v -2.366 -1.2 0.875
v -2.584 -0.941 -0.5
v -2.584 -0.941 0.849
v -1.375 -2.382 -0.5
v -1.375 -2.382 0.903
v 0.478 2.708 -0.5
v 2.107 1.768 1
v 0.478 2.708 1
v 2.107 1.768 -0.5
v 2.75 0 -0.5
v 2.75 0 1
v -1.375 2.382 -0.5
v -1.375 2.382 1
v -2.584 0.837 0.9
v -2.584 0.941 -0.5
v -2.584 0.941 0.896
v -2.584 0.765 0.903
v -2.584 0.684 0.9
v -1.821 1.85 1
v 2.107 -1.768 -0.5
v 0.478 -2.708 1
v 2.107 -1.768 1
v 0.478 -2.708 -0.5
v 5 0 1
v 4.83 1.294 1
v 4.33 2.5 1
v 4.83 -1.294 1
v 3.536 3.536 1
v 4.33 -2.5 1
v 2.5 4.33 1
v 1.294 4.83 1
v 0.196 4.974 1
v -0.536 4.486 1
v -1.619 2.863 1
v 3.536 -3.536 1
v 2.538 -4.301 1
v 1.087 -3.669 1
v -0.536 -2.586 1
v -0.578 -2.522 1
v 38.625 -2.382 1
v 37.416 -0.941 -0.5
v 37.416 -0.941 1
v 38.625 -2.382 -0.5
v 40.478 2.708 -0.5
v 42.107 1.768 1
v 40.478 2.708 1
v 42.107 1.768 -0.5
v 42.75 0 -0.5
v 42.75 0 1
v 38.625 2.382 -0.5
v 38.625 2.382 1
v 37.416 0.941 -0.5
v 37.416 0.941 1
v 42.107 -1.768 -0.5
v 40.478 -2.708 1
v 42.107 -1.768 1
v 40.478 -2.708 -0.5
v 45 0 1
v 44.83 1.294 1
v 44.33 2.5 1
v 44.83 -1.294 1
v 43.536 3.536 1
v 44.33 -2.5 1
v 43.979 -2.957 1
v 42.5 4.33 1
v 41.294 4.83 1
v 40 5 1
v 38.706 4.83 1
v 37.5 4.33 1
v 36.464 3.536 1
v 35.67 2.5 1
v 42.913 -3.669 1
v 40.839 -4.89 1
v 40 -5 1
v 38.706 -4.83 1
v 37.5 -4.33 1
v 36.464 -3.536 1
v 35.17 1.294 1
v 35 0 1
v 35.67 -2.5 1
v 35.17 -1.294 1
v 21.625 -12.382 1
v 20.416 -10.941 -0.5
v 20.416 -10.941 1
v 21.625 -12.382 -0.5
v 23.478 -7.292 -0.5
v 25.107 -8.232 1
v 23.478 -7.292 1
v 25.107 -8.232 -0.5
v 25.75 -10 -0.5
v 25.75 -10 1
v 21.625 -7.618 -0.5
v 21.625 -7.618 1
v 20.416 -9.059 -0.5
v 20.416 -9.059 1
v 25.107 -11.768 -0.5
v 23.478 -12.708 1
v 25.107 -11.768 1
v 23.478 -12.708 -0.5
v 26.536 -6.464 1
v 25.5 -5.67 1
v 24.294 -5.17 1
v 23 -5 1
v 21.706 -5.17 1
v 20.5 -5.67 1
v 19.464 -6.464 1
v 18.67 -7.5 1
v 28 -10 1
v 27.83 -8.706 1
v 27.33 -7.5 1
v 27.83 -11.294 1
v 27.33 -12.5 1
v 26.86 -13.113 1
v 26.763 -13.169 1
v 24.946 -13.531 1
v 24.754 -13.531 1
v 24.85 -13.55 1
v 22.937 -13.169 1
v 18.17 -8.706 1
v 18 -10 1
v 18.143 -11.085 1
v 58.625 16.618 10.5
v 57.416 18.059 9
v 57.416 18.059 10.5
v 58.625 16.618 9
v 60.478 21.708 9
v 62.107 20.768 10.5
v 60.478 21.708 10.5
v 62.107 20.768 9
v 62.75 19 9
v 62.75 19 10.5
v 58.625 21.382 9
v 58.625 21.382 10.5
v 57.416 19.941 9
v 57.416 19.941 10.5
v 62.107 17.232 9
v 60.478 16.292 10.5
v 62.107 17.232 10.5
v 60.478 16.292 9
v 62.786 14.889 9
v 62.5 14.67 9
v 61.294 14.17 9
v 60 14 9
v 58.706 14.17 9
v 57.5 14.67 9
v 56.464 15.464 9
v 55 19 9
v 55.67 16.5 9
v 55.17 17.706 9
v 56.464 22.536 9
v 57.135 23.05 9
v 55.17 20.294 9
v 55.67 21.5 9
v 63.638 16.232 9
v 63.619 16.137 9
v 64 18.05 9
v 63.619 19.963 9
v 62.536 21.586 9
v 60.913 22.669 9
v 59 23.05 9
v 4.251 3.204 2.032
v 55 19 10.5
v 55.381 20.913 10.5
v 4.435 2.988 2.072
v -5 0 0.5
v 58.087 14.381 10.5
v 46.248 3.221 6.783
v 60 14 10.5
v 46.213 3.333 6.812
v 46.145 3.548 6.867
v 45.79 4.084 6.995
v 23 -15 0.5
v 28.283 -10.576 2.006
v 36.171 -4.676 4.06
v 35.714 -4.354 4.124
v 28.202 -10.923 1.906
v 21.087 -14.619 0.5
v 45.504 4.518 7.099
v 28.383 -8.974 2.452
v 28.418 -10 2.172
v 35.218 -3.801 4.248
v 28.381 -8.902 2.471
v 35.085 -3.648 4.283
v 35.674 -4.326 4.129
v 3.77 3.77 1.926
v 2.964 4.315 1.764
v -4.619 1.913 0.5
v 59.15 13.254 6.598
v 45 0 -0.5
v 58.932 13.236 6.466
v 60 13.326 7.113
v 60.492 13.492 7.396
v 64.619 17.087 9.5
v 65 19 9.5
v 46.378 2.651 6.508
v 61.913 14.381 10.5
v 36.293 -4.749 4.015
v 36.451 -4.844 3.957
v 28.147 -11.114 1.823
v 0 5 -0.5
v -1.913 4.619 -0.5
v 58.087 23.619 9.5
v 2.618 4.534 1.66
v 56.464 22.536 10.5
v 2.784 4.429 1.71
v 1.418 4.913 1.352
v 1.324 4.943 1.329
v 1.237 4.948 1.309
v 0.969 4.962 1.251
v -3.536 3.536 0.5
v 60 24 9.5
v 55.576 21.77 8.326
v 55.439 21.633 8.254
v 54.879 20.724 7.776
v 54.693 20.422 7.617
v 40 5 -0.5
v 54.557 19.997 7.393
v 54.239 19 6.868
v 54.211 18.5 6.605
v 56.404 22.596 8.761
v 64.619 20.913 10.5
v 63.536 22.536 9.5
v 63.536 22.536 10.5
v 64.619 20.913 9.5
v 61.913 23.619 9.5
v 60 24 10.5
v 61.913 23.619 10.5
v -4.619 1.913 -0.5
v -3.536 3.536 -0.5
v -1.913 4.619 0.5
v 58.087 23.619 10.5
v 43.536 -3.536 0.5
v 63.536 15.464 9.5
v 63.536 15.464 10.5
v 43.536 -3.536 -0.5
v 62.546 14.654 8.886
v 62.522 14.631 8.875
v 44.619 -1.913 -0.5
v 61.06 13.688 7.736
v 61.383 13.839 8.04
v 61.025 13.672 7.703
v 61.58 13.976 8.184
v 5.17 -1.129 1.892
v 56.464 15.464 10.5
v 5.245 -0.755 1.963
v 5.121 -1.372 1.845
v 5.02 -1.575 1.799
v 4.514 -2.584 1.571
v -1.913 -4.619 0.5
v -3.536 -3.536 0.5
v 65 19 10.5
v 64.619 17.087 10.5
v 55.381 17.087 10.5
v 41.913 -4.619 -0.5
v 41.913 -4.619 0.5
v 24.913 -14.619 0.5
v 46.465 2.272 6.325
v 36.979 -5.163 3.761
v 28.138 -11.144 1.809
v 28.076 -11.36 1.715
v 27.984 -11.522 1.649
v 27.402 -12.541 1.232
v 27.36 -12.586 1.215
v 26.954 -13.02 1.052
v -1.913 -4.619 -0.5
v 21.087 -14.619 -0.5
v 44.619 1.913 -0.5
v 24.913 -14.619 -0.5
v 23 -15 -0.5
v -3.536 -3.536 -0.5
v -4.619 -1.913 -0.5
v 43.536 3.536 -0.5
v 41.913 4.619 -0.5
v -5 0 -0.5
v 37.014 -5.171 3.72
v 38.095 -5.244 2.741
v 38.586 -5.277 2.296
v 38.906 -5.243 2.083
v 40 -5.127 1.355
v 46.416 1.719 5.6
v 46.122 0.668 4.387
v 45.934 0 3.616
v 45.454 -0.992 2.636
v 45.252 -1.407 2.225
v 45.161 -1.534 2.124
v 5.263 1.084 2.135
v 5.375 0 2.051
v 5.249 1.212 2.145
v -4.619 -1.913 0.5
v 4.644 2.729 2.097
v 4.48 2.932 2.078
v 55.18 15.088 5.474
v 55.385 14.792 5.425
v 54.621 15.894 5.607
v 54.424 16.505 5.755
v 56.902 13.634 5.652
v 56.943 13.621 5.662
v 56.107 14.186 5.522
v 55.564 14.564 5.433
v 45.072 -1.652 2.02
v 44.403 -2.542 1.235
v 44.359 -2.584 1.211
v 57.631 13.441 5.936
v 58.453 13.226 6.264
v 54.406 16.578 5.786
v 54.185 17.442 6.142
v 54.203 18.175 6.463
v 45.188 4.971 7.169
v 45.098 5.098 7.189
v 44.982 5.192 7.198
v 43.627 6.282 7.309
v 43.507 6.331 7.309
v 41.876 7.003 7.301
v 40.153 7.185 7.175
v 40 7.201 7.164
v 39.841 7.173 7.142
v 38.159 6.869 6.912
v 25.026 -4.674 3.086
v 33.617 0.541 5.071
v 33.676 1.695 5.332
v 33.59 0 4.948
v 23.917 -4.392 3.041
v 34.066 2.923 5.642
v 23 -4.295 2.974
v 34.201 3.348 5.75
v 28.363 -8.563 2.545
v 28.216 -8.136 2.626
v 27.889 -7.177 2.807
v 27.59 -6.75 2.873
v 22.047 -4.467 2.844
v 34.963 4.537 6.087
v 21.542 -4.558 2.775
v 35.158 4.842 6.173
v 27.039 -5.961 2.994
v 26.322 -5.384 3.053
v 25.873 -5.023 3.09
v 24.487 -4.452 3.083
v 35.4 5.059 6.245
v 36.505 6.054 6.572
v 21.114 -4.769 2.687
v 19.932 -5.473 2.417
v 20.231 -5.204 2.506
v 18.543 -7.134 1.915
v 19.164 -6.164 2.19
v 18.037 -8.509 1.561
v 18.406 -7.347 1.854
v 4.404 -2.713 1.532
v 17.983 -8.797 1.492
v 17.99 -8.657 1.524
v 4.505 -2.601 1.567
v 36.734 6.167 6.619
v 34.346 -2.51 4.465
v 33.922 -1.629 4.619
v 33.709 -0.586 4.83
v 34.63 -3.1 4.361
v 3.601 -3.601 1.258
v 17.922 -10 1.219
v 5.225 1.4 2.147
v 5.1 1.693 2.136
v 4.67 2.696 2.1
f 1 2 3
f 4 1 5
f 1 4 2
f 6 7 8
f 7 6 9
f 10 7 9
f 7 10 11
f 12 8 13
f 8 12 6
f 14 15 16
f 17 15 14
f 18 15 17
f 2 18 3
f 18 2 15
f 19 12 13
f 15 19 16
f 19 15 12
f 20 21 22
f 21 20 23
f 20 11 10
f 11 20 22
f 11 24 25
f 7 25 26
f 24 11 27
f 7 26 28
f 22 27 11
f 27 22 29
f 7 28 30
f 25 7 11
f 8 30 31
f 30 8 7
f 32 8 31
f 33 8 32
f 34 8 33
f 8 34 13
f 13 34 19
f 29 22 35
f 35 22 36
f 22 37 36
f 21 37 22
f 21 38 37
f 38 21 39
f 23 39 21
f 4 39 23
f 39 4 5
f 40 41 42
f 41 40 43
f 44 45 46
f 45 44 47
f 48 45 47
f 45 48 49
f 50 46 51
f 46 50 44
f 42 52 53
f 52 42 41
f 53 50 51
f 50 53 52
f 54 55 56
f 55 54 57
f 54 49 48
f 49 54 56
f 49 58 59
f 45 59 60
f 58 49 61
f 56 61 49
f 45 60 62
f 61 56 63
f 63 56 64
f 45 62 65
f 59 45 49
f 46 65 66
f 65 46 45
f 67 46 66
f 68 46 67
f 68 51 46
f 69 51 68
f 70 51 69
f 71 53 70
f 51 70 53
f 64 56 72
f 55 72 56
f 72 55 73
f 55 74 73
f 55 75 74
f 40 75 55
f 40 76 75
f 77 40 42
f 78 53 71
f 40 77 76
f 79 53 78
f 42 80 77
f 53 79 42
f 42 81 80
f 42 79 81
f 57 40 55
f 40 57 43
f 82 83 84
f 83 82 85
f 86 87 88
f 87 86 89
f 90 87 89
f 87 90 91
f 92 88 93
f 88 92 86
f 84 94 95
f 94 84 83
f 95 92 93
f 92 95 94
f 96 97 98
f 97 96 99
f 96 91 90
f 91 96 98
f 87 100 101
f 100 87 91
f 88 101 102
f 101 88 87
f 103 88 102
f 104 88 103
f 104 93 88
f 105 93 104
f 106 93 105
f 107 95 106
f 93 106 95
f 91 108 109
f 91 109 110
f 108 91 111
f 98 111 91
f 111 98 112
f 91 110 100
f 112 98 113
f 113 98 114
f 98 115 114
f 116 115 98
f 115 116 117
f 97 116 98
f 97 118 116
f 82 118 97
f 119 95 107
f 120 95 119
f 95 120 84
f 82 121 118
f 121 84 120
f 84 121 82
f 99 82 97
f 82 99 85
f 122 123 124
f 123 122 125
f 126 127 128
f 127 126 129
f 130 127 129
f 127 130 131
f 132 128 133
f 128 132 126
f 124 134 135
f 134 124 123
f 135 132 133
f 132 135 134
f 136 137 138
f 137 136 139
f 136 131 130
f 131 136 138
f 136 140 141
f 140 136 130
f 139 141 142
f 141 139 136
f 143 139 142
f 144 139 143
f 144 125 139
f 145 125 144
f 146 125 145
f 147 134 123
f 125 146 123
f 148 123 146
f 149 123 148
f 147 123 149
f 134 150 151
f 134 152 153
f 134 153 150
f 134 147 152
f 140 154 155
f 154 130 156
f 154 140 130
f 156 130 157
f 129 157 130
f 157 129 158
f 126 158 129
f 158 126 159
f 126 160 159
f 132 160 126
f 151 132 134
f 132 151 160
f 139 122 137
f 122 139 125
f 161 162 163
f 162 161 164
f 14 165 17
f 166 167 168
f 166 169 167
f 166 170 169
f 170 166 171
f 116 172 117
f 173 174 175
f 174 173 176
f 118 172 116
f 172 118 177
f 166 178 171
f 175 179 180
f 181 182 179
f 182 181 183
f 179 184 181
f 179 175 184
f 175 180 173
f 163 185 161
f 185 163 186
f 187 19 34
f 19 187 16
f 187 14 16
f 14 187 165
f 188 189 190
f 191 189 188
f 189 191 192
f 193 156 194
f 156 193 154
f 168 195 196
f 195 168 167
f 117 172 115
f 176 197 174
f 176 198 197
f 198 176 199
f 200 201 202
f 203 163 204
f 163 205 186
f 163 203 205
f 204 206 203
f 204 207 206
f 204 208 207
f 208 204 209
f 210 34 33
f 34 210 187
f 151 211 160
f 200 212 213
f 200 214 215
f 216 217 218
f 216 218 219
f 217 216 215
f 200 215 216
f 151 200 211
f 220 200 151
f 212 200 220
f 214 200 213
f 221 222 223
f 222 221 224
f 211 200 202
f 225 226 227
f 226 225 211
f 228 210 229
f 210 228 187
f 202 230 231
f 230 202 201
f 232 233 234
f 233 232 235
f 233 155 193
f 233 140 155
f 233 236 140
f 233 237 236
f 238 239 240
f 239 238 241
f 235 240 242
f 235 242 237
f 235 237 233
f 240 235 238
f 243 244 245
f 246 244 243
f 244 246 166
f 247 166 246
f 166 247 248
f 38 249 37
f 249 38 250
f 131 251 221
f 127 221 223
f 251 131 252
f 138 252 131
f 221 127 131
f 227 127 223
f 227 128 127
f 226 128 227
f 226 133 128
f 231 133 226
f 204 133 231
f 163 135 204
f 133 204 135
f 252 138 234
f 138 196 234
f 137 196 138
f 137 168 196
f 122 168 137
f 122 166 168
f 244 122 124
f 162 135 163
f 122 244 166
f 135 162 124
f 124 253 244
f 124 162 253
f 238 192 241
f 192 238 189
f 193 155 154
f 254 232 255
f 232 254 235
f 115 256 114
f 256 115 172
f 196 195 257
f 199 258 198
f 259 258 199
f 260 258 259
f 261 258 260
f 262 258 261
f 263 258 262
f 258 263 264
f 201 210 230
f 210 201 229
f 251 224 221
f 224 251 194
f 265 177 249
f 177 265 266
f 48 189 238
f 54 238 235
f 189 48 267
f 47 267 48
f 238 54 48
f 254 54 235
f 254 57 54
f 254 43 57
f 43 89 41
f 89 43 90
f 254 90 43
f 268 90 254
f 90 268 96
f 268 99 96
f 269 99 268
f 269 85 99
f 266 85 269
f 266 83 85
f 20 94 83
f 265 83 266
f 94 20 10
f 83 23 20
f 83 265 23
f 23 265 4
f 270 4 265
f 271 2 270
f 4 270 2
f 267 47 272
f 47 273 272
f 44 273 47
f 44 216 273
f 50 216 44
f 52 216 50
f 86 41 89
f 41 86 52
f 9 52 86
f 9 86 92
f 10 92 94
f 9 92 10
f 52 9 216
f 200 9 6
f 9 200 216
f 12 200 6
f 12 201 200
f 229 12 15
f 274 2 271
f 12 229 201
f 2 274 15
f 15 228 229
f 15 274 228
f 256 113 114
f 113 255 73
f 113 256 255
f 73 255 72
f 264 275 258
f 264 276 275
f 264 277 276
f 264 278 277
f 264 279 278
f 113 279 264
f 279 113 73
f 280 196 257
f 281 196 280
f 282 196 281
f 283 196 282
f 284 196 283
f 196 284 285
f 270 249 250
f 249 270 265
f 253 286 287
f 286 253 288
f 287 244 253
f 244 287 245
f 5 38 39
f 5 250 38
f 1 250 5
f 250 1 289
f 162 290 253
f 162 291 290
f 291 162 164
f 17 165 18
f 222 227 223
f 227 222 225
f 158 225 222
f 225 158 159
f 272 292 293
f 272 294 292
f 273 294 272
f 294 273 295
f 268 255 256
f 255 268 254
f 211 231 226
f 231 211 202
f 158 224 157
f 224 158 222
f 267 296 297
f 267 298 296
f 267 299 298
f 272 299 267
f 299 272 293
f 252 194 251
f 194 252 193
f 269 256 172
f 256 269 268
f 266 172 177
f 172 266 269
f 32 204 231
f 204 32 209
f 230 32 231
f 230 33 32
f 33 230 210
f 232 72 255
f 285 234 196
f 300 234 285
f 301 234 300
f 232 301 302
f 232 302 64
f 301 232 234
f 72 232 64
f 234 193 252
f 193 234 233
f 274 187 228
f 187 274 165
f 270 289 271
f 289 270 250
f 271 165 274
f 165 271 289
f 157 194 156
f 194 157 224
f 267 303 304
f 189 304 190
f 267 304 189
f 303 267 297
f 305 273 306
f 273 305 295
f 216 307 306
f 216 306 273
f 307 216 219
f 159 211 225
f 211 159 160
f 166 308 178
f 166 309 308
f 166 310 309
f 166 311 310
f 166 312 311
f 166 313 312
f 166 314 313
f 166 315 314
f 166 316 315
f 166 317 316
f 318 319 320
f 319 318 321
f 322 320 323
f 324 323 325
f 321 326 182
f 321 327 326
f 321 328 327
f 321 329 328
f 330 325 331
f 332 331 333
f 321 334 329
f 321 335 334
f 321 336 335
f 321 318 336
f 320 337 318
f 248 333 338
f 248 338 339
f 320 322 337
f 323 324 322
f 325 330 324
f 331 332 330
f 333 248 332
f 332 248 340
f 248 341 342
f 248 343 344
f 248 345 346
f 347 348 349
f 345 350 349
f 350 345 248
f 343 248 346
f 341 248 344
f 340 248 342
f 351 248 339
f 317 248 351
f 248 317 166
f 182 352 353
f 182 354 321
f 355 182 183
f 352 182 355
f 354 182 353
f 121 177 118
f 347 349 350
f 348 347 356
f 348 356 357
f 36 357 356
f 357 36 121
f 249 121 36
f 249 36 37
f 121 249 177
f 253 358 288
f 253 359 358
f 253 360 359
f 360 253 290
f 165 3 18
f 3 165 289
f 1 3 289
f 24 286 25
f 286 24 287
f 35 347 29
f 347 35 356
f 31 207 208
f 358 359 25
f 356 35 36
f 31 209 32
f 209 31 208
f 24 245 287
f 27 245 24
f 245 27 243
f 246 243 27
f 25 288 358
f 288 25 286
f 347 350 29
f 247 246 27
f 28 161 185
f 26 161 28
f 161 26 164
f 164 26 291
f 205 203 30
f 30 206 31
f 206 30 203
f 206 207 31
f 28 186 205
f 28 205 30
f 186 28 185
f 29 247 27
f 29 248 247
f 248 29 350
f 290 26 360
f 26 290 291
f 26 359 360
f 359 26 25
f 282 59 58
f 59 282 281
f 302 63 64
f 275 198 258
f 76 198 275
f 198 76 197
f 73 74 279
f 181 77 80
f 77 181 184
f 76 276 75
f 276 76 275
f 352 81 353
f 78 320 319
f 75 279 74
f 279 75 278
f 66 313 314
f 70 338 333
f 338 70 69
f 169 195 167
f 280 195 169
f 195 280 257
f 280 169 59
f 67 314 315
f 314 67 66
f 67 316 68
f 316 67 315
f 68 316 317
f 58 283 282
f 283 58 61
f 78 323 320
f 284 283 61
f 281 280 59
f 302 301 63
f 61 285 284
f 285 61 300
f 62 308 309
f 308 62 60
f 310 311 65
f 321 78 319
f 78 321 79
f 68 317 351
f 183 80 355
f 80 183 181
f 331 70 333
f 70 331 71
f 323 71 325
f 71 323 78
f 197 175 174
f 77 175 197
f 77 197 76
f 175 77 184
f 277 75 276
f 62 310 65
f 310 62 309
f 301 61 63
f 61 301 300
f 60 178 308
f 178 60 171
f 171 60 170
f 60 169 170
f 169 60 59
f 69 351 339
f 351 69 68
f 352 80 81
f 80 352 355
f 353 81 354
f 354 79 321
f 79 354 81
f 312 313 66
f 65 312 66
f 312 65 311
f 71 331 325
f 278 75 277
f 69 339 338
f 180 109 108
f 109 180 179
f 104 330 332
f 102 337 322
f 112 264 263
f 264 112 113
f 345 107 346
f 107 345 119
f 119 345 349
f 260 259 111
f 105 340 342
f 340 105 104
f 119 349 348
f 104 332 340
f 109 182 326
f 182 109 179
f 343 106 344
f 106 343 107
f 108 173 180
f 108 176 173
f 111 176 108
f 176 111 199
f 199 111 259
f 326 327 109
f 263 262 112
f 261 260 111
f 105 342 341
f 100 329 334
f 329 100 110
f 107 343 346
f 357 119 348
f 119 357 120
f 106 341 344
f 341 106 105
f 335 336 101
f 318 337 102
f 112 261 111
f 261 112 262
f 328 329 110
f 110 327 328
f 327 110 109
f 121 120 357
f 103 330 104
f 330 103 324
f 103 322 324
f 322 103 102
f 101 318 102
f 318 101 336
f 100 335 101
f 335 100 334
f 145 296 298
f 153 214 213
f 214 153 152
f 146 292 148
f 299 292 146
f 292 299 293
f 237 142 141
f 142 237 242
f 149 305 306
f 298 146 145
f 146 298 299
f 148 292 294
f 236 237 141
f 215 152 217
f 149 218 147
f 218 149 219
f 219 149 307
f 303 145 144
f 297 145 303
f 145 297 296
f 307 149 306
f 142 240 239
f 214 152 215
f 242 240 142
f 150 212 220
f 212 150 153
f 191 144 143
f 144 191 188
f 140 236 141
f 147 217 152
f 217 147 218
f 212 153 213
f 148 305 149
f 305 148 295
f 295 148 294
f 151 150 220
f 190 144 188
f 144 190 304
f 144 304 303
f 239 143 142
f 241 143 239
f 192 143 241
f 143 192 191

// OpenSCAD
module cylinders(points, diameter, thickness){
    for (p=points){
        translate(p) cylinder(d=diameter, h=thickness, center=true);
    }
}
 
module plate(points, diameter, thickness, hole_diameter){
    difference(){
        hull() cylinders(points, diameter, thickness);
        cylinders(points, hole_diameter, thickness+1);
    }
}
 
module bar(length, width, thickness, hole_diameter){
    plate([[0,0,0], [length,0,0]], width, thickness, hole_diameter);
}

points = [ [0,0,0], [40,0,0], [23,-10,0], [60,19,10] ];
difference(){
    plate(points, 10, 1, 5.5);
    for (p=points){
        translate(p + [0,0,1])
            cylinder(d1=10, d2=15, h=7);
        translate(p + [0,0,-1])
            mirror([0,0,1])
            cylinder(d1=10, d2=15, h=7);
    }
}
